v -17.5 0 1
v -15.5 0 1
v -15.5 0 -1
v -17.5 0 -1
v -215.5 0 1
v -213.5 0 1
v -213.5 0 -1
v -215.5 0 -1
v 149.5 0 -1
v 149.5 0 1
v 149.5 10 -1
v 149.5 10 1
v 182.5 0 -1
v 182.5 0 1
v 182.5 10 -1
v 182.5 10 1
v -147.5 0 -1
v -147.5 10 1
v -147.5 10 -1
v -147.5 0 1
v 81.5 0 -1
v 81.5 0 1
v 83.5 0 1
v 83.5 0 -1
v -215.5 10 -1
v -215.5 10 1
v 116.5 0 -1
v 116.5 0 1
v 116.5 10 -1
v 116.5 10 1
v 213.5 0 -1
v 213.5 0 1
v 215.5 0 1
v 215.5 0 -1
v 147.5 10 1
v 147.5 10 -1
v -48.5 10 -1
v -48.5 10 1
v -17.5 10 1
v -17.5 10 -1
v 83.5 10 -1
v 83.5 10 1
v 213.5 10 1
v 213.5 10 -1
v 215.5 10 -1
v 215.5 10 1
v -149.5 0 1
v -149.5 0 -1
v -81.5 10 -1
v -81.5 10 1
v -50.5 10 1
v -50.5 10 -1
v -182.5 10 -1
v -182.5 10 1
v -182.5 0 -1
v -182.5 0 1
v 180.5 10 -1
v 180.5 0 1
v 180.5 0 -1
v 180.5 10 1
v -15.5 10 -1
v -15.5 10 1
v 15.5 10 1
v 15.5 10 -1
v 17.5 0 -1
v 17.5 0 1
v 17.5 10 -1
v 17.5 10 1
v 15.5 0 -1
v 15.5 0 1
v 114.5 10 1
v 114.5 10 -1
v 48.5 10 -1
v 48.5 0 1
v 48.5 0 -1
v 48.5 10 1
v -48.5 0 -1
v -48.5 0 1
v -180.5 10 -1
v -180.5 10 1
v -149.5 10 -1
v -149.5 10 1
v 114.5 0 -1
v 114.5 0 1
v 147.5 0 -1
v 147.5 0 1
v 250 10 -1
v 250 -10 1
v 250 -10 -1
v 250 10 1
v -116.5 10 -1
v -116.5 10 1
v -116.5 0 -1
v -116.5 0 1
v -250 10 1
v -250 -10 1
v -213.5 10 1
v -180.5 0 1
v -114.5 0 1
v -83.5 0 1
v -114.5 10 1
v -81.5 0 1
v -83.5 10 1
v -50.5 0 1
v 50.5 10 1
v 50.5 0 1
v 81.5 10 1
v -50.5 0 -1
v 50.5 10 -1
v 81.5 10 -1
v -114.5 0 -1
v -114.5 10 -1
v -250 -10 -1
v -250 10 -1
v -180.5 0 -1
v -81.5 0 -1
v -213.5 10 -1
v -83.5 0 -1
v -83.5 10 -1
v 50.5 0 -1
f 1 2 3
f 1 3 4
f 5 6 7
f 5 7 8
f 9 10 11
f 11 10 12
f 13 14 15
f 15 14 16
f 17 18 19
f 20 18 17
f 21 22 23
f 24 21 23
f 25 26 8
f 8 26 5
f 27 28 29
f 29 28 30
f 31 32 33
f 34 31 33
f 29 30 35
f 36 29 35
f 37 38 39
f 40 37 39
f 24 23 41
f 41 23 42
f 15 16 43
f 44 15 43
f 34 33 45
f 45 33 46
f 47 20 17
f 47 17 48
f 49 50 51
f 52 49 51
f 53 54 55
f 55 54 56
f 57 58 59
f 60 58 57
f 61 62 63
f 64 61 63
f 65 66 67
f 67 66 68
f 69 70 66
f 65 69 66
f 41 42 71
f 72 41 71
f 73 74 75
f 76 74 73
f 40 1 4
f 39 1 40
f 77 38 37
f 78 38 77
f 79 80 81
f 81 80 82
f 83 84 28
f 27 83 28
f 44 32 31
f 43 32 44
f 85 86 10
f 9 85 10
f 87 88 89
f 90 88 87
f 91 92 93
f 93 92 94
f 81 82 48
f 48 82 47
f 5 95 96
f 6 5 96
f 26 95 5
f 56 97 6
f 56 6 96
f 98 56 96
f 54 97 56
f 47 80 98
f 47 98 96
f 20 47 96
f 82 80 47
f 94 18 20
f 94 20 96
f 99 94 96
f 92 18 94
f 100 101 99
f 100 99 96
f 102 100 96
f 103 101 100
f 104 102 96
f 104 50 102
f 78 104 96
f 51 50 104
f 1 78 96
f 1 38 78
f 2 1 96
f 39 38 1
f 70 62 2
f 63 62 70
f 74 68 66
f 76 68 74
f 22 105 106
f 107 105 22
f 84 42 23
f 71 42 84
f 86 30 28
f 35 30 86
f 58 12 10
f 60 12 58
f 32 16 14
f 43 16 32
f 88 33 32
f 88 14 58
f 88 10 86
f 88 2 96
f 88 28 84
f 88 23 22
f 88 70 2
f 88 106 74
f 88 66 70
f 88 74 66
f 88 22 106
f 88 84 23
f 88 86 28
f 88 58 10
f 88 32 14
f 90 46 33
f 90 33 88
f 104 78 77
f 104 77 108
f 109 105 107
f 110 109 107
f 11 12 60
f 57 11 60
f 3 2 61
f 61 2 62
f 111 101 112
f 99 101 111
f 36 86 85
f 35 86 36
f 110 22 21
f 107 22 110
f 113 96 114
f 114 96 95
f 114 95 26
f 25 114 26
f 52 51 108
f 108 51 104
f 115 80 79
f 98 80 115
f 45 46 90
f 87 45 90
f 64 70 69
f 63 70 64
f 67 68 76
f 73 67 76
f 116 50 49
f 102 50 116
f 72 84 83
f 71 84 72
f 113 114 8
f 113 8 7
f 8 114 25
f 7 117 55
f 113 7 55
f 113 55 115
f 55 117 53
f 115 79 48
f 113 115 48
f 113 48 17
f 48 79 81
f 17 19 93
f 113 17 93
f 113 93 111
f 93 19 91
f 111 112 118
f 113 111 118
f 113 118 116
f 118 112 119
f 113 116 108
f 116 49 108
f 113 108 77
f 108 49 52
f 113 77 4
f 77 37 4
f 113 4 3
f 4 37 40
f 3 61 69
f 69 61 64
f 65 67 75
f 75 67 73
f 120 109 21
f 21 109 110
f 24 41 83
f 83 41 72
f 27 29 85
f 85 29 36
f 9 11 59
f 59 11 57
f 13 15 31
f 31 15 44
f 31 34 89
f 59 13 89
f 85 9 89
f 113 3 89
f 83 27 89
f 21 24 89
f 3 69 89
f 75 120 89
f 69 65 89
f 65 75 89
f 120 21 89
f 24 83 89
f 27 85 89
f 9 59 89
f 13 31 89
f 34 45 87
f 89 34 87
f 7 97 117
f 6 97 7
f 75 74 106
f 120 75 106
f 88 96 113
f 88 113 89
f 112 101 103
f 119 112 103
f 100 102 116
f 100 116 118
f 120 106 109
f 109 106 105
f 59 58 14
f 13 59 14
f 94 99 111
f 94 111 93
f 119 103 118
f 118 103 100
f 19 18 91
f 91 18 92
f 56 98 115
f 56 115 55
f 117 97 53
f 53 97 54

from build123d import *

# Parameters (mm, degrees)
ESQUISSE1_W                = 500
ESQUISSE1_H                = 20
BOSS_EXTRU_1_DEPTH         = 1
ESQUISSE2_W                = 2
ESQUISSE2_H                = 10
ENL_V_MAT_EXTRU_1_DEPTH    = 3
R_P_TITION_LIN_AIRE1_COUNT = 7
R_P_TITION_LIN_AIRE1_PITCH = 33
SYM_TRIE1_COPY_1_SKETCH_W  = 2
SYM_TRIE1_COPY_1_SKETCH_H  = 10
SYM_TRIE1_COPY_1_DEPTH     = 3
SYM_TRIE1_COPY_2_SKETCH_W  = 2
SYM_TRIE1_COPY_2_SKETCH_H  = 10
SYM_TRIE1_COPY_2_DEPTH     = 3
SYM_TRIE1_COPY_3_SKETCH_W  = 2
SYM_TRIE1_COPY_3_SKETCH_H  = 10
SYM_TRIE1_COPY_3_DEPTH     = 3
SYM_TRIE1_COPY_4_SKETCH_W  = 2
SYM_TRIE1_COPY_4_SKETCH_H  = 10
SYM_TRIE1_COPY_4_DEPTH     = 3
SYM_TRIE1_COPY_5_SKETCH_W  = 2
SYM_TRIE1_COPY_5_SKETCH_H  = 10
SYM_TRIE1_COPY_5_DEPTH     = 3
SYM_TRIE1_COPY_6_SKETCH_W  = 2
SYM_TRIE1_COPY_6_SKETCH_H  = 10
SYM_TRIE1_COPY_6_DEPTH     = 3


with BuildPart() as part:
    # Esquisse1 → Boss.-Extru.1 (new body, symmetric)
    with BuildSketch(Plane.XY):
        Rectangle(ESQUISSE1_W, ESQUISSE1_H)
    extrude(amount=BOSS_EXTRU_1_DEPTH, both=True)

    # Esquisse2 → Enlèv. mat.-Extru.1 (cut, through all)
    with BuildSketch(Plane.XY.offset(1)):
        with Locations((16.5, 5)):
            Rectangle(ESQUISSE2_W, ESQUISSE2_H)
    enl_v_mat_extru_1 = extrude(amount=-ENL_V_MAT_EXTRU_1_DEPTH, mode=Mode.SUBTRACT)

    # Répétition linéaire1: Enlèv. mat.-Extru.1 ×7
    with Locations(*[(i * R_P_TITION_LIN_AIRE1_PITCH, 0, 0) for i in range(1, R_P_TITION_LIN_AIRE1_COUNT)]):
        add(enl_v_mat_extru_1, mode=Mode.SUBTRACT)

    # Symétrie1: Enlèv. mat.-Extru.1 across plane
    add(enl_v_mat_extru_1.mirror(Plane(origin=(0, 0, 0), x_dir=(0, 0, 1), z_dir=(1, 0, 0))), mode=Mode.SUBTRACT)

    # Symétrie1 copy 1 sketch → Symétrie1 copy 1 (cut, through all)
    with BuildSketch(Plane(origin=(-33, 0, 1), x_dir=(-1, 0, 0), z_dir=(0, 0, 1))):
        with Locations((16.5, -5)):
            Rectangle(SYM_TRIE1_COPY_1_SKETCH_W, SYM_TRIE1_COPY_1_SKETCH_H)
    extrude(amount=-SYM_TRIE1_COPY_1_DEPTH, mode=Mode.SUBTRACT)

    # Symétrie1 copy 2 sketch → Symétrie1 copy 2 (cut, through all)
    with BuildSketch(Plane(origin=(-66, 0, 1), x_dir=(-1, 0, 0), z_dir=(0, 0, 1))):
        with Locations((16.5, -5)):
            Rectangle(SYM_TRIE1_COPY_2_SKETCH_W, SYM_TRIE1_COPY_2_SKETCH_H)
    extrude(amount=-SYM_TRIE1_COPY_2_DEPTH, mode=Mode.SUBTRACT)

    # Symétrie1 copy 3 sketch → Symétrie1 copy 3 (cut, through all)
    with BuildSketch(Plane(origin=(-99, 0, 1), x_dir=(-1, 0, 0), z_dir=(0, 0, 1))):
        with Locations((16.5, -5)):
            Rectangle(SYM_TRIE1_COPY_3_SKETCH_W, SYM_TRIE1_COPY_3_SKETCH_H)
    extrude(amount=-SYM_TRIE1_COPY_3_DEPTH, mode=Mode.SUBTRACT)

    # Symétrie1 copy 4 sketch → Symétrie1 copy 4 (cut, through all)
    with BuildSketch(Plane(origin=(-132, 0, 1), x_dir=(-1, 0, 0), z_dir=(0, 0, 1))):
        with Locations((16.5, -5)):
            Rectangle(SYM_TRIE1_COPY_4_SKETCH_W, SYM_TRIE1_COPY_4_SKETCH_H)
    extrude(amount=-SYM_TRIE1_COPY_4_DEPTH, mode=Mode.SUBTRACT)

    # Symétrie1 copy 5 sketch → Symétrie1 copy 5 (cut, through all)
    with BuildSketch(Plane(origin=(-165, 0, 1), x_dir=(-1, 0, 0), z_dir=(0, 0, 1))):
        with Locations((16.5, -5)):
            Rectangle(SYM_TRIE1_COPY_5_SKETCH_W, SYM_TRIE1_COPY_5_SKETCH_H)
    extrude(amount=-SYM_TRIE1_COPY_5_DEPTH, mode=Mode.SUBTRACT)

    # Symétrie1 copy 6 sketch → Symétrie1 copy 6 (cut, through all)
    with BuildSketch(Plane(origin=(-198, 0, 1), x_dir=(-1, 0, 0), z_dir=(0, 0, 1))):
        with Locations((16.5, -5)):
            Rectangle(SYM_TRIE1_COPY_6_SKETCH_W, SYM_TRIE1_COPY_6_SKETCH_H)
    extrude(amount=-SYM_TRIE1_COPY_6_DEPTH, mode=Mode.SUBTRACT)


solid = part.part
